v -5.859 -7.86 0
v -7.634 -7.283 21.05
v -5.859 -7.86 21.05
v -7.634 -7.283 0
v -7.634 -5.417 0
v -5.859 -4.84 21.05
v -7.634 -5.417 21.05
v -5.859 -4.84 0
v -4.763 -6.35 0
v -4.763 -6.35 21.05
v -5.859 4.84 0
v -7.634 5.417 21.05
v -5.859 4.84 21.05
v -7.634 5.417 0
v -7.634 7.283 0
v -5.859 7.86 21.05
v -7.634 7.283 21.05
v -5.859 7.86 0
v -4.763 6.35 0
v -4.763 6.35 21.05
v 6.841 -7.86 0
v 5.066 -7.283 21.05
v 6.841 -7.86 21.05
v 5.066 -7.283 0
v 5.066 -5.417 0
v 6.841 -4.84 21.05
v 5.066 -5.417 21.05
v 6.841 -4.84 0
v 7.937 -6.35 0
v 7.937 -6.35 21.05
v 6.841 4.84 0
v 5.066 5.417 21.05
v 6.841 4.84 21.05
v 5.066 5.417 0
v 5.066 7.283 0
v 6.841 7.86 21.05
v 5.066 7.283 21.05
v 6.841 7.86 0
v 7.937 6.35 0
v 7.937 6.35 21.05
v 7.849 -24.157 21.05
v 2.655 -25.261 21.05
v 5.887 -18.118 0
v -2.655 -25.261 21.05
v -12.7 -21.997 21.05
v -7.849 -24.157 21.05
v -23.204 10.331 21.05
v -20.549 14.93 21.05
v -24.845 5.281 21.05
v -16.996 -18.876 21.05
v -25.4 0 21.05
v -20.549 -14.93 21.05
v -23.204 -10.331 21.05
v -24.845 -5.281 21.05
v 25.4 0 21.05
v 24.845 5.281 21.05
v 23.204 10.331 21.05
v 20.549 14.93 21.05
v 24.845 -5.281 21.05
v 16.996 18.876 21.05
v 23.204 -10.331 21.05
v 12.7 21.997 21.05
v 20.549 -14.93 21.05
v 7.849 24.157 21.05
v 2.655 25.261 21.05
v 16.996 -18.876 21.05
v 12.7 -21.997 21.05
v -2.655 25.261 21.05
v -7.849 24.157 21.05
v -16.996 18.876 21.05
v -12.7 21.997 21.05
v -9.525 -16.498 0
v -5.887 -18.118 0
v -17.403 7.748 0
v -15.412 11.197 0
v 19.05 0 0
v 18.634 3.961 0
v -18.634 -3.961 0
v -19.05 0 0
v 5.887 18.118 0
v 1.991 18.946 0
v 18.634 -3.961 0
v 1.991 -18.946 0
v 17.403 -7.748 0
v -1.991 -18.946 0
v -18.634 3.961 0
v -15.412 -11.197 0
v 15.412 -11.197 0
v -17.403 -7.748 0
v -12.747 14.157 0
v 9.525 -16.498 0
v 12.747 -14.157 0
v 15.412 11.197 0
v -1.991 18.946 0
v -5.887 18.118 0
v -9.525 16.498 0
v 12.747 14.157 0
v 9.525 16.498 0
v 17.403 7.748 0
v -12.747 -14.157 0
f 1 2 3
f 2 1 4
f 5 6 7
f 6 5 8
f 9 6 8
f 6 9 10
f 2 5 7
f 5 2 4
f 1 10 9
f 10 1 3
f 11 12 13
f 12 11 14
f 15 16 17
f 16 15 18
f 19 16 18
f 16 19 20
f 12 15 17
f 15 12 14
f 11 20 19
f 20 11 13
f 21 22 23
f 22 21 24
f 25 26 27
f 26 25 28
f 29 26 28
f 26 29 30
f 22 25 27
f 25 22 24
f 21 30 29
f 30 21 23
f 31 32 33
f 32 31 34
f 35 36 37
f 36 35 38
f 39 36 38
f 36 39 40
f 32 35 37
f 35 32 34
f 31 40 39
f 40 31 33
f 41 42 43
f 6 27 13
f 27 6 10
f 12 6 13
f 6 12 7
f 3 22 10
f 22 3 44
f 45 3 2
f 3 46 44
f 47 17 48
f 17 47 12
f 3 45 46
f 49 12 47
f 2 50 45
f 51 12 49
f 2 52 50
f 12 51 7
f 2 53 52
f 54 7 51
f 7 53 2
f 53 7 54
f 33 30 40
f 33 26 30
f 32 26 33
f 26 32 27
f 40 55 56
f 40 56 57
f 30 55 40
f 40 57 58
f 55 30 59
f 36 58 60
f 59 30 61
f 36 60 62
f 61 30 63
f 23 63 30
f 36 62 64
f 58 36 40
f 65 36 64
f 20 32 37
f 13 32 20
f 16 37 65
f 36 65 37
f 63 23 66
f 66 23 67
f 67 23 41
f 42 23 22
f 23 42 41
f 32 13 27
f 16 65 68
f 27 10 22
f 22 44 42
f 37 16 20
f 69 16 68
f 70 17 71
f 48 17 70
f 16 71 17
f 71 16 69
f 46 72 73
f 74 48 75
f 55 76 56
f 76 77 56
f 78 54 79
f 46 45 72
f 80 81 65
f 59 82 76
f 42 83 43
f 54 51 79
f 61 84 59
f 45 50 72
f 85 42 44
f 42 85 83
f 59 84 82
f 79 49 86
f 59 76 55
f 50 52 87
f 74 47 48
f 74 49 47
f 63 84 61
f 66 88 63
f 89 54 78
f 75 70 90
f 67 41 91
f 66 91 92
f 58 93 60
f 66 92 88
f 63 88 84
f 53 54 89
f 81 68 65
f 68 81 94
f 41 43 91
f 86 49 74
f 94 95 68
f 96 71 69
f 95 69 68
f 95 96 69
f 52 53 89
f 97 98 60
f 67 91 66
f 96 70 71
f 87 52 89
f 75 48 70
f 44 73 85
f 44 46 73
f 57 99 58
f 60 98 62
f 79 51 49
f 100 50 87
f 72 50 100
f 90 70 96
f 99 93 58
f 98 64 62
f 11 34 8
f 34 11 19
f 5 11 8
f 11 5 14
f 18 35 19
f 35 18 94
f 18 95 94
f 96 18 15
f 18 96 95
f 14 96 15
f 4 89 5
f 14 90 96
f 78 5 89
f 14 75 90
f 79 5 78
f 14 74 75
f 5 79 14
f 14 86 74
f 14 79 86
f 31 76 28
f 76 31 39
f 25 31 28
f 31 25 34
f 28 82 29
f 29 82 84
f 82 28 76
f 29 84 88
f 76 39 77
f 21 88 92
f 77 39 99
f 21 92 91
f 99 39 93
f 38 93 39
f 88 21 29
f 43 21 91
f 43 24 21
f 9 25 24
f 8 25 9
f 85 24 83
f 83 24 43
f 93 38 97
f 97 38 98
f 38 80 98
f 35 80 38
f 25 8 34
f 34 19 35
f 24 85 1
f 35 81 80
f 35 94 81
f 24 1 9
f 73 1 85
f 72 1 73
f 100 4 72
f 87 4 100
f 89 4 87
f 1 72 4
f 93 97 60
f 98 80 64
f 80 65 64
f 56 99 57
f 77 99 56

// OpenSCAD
function mm(i) = i*25.4; 
    tubediam = mm(2); //diameter of the cardboard tube at the center
	 thickness= mm(.75); // thickness of material
	 boltwidth = mm(1/8); // desired diameter of bolt holes
	


module tubehold(tubediam=mm(2),thickness=mm(.75), boltwidth=mm(1/8),) 
    {
		difference()
			{	
			cylinder(thickness+2, (tubediam-mm(1/2))/2, tubediam/2, 0);
			translate([-tubediam/8,-tubediam/8,0])
				{
				union()
					{				
					translate([0, 0, -1])
						{
						cylinder(thickness+4, boltwidth/2, boltwidth/2, 0);
						}
					translate([0, mm(.5), -1])
						{
							cylinder(thickness+4, boltwidth/2, boltwidth/2, 0);
						}
					translate([mm(.5), 0, -1])
						{
							cylinder(thickness+4, boltwidth/2, boltwidth/2, 0);
						}
					translate([mm(.5), mm(.5), -1])
						{
							cylinder(thickness+4, boltwidth/2, boltwidth/2, 0);
						}
					}
				}
				
		}
	 }

tubehold();
